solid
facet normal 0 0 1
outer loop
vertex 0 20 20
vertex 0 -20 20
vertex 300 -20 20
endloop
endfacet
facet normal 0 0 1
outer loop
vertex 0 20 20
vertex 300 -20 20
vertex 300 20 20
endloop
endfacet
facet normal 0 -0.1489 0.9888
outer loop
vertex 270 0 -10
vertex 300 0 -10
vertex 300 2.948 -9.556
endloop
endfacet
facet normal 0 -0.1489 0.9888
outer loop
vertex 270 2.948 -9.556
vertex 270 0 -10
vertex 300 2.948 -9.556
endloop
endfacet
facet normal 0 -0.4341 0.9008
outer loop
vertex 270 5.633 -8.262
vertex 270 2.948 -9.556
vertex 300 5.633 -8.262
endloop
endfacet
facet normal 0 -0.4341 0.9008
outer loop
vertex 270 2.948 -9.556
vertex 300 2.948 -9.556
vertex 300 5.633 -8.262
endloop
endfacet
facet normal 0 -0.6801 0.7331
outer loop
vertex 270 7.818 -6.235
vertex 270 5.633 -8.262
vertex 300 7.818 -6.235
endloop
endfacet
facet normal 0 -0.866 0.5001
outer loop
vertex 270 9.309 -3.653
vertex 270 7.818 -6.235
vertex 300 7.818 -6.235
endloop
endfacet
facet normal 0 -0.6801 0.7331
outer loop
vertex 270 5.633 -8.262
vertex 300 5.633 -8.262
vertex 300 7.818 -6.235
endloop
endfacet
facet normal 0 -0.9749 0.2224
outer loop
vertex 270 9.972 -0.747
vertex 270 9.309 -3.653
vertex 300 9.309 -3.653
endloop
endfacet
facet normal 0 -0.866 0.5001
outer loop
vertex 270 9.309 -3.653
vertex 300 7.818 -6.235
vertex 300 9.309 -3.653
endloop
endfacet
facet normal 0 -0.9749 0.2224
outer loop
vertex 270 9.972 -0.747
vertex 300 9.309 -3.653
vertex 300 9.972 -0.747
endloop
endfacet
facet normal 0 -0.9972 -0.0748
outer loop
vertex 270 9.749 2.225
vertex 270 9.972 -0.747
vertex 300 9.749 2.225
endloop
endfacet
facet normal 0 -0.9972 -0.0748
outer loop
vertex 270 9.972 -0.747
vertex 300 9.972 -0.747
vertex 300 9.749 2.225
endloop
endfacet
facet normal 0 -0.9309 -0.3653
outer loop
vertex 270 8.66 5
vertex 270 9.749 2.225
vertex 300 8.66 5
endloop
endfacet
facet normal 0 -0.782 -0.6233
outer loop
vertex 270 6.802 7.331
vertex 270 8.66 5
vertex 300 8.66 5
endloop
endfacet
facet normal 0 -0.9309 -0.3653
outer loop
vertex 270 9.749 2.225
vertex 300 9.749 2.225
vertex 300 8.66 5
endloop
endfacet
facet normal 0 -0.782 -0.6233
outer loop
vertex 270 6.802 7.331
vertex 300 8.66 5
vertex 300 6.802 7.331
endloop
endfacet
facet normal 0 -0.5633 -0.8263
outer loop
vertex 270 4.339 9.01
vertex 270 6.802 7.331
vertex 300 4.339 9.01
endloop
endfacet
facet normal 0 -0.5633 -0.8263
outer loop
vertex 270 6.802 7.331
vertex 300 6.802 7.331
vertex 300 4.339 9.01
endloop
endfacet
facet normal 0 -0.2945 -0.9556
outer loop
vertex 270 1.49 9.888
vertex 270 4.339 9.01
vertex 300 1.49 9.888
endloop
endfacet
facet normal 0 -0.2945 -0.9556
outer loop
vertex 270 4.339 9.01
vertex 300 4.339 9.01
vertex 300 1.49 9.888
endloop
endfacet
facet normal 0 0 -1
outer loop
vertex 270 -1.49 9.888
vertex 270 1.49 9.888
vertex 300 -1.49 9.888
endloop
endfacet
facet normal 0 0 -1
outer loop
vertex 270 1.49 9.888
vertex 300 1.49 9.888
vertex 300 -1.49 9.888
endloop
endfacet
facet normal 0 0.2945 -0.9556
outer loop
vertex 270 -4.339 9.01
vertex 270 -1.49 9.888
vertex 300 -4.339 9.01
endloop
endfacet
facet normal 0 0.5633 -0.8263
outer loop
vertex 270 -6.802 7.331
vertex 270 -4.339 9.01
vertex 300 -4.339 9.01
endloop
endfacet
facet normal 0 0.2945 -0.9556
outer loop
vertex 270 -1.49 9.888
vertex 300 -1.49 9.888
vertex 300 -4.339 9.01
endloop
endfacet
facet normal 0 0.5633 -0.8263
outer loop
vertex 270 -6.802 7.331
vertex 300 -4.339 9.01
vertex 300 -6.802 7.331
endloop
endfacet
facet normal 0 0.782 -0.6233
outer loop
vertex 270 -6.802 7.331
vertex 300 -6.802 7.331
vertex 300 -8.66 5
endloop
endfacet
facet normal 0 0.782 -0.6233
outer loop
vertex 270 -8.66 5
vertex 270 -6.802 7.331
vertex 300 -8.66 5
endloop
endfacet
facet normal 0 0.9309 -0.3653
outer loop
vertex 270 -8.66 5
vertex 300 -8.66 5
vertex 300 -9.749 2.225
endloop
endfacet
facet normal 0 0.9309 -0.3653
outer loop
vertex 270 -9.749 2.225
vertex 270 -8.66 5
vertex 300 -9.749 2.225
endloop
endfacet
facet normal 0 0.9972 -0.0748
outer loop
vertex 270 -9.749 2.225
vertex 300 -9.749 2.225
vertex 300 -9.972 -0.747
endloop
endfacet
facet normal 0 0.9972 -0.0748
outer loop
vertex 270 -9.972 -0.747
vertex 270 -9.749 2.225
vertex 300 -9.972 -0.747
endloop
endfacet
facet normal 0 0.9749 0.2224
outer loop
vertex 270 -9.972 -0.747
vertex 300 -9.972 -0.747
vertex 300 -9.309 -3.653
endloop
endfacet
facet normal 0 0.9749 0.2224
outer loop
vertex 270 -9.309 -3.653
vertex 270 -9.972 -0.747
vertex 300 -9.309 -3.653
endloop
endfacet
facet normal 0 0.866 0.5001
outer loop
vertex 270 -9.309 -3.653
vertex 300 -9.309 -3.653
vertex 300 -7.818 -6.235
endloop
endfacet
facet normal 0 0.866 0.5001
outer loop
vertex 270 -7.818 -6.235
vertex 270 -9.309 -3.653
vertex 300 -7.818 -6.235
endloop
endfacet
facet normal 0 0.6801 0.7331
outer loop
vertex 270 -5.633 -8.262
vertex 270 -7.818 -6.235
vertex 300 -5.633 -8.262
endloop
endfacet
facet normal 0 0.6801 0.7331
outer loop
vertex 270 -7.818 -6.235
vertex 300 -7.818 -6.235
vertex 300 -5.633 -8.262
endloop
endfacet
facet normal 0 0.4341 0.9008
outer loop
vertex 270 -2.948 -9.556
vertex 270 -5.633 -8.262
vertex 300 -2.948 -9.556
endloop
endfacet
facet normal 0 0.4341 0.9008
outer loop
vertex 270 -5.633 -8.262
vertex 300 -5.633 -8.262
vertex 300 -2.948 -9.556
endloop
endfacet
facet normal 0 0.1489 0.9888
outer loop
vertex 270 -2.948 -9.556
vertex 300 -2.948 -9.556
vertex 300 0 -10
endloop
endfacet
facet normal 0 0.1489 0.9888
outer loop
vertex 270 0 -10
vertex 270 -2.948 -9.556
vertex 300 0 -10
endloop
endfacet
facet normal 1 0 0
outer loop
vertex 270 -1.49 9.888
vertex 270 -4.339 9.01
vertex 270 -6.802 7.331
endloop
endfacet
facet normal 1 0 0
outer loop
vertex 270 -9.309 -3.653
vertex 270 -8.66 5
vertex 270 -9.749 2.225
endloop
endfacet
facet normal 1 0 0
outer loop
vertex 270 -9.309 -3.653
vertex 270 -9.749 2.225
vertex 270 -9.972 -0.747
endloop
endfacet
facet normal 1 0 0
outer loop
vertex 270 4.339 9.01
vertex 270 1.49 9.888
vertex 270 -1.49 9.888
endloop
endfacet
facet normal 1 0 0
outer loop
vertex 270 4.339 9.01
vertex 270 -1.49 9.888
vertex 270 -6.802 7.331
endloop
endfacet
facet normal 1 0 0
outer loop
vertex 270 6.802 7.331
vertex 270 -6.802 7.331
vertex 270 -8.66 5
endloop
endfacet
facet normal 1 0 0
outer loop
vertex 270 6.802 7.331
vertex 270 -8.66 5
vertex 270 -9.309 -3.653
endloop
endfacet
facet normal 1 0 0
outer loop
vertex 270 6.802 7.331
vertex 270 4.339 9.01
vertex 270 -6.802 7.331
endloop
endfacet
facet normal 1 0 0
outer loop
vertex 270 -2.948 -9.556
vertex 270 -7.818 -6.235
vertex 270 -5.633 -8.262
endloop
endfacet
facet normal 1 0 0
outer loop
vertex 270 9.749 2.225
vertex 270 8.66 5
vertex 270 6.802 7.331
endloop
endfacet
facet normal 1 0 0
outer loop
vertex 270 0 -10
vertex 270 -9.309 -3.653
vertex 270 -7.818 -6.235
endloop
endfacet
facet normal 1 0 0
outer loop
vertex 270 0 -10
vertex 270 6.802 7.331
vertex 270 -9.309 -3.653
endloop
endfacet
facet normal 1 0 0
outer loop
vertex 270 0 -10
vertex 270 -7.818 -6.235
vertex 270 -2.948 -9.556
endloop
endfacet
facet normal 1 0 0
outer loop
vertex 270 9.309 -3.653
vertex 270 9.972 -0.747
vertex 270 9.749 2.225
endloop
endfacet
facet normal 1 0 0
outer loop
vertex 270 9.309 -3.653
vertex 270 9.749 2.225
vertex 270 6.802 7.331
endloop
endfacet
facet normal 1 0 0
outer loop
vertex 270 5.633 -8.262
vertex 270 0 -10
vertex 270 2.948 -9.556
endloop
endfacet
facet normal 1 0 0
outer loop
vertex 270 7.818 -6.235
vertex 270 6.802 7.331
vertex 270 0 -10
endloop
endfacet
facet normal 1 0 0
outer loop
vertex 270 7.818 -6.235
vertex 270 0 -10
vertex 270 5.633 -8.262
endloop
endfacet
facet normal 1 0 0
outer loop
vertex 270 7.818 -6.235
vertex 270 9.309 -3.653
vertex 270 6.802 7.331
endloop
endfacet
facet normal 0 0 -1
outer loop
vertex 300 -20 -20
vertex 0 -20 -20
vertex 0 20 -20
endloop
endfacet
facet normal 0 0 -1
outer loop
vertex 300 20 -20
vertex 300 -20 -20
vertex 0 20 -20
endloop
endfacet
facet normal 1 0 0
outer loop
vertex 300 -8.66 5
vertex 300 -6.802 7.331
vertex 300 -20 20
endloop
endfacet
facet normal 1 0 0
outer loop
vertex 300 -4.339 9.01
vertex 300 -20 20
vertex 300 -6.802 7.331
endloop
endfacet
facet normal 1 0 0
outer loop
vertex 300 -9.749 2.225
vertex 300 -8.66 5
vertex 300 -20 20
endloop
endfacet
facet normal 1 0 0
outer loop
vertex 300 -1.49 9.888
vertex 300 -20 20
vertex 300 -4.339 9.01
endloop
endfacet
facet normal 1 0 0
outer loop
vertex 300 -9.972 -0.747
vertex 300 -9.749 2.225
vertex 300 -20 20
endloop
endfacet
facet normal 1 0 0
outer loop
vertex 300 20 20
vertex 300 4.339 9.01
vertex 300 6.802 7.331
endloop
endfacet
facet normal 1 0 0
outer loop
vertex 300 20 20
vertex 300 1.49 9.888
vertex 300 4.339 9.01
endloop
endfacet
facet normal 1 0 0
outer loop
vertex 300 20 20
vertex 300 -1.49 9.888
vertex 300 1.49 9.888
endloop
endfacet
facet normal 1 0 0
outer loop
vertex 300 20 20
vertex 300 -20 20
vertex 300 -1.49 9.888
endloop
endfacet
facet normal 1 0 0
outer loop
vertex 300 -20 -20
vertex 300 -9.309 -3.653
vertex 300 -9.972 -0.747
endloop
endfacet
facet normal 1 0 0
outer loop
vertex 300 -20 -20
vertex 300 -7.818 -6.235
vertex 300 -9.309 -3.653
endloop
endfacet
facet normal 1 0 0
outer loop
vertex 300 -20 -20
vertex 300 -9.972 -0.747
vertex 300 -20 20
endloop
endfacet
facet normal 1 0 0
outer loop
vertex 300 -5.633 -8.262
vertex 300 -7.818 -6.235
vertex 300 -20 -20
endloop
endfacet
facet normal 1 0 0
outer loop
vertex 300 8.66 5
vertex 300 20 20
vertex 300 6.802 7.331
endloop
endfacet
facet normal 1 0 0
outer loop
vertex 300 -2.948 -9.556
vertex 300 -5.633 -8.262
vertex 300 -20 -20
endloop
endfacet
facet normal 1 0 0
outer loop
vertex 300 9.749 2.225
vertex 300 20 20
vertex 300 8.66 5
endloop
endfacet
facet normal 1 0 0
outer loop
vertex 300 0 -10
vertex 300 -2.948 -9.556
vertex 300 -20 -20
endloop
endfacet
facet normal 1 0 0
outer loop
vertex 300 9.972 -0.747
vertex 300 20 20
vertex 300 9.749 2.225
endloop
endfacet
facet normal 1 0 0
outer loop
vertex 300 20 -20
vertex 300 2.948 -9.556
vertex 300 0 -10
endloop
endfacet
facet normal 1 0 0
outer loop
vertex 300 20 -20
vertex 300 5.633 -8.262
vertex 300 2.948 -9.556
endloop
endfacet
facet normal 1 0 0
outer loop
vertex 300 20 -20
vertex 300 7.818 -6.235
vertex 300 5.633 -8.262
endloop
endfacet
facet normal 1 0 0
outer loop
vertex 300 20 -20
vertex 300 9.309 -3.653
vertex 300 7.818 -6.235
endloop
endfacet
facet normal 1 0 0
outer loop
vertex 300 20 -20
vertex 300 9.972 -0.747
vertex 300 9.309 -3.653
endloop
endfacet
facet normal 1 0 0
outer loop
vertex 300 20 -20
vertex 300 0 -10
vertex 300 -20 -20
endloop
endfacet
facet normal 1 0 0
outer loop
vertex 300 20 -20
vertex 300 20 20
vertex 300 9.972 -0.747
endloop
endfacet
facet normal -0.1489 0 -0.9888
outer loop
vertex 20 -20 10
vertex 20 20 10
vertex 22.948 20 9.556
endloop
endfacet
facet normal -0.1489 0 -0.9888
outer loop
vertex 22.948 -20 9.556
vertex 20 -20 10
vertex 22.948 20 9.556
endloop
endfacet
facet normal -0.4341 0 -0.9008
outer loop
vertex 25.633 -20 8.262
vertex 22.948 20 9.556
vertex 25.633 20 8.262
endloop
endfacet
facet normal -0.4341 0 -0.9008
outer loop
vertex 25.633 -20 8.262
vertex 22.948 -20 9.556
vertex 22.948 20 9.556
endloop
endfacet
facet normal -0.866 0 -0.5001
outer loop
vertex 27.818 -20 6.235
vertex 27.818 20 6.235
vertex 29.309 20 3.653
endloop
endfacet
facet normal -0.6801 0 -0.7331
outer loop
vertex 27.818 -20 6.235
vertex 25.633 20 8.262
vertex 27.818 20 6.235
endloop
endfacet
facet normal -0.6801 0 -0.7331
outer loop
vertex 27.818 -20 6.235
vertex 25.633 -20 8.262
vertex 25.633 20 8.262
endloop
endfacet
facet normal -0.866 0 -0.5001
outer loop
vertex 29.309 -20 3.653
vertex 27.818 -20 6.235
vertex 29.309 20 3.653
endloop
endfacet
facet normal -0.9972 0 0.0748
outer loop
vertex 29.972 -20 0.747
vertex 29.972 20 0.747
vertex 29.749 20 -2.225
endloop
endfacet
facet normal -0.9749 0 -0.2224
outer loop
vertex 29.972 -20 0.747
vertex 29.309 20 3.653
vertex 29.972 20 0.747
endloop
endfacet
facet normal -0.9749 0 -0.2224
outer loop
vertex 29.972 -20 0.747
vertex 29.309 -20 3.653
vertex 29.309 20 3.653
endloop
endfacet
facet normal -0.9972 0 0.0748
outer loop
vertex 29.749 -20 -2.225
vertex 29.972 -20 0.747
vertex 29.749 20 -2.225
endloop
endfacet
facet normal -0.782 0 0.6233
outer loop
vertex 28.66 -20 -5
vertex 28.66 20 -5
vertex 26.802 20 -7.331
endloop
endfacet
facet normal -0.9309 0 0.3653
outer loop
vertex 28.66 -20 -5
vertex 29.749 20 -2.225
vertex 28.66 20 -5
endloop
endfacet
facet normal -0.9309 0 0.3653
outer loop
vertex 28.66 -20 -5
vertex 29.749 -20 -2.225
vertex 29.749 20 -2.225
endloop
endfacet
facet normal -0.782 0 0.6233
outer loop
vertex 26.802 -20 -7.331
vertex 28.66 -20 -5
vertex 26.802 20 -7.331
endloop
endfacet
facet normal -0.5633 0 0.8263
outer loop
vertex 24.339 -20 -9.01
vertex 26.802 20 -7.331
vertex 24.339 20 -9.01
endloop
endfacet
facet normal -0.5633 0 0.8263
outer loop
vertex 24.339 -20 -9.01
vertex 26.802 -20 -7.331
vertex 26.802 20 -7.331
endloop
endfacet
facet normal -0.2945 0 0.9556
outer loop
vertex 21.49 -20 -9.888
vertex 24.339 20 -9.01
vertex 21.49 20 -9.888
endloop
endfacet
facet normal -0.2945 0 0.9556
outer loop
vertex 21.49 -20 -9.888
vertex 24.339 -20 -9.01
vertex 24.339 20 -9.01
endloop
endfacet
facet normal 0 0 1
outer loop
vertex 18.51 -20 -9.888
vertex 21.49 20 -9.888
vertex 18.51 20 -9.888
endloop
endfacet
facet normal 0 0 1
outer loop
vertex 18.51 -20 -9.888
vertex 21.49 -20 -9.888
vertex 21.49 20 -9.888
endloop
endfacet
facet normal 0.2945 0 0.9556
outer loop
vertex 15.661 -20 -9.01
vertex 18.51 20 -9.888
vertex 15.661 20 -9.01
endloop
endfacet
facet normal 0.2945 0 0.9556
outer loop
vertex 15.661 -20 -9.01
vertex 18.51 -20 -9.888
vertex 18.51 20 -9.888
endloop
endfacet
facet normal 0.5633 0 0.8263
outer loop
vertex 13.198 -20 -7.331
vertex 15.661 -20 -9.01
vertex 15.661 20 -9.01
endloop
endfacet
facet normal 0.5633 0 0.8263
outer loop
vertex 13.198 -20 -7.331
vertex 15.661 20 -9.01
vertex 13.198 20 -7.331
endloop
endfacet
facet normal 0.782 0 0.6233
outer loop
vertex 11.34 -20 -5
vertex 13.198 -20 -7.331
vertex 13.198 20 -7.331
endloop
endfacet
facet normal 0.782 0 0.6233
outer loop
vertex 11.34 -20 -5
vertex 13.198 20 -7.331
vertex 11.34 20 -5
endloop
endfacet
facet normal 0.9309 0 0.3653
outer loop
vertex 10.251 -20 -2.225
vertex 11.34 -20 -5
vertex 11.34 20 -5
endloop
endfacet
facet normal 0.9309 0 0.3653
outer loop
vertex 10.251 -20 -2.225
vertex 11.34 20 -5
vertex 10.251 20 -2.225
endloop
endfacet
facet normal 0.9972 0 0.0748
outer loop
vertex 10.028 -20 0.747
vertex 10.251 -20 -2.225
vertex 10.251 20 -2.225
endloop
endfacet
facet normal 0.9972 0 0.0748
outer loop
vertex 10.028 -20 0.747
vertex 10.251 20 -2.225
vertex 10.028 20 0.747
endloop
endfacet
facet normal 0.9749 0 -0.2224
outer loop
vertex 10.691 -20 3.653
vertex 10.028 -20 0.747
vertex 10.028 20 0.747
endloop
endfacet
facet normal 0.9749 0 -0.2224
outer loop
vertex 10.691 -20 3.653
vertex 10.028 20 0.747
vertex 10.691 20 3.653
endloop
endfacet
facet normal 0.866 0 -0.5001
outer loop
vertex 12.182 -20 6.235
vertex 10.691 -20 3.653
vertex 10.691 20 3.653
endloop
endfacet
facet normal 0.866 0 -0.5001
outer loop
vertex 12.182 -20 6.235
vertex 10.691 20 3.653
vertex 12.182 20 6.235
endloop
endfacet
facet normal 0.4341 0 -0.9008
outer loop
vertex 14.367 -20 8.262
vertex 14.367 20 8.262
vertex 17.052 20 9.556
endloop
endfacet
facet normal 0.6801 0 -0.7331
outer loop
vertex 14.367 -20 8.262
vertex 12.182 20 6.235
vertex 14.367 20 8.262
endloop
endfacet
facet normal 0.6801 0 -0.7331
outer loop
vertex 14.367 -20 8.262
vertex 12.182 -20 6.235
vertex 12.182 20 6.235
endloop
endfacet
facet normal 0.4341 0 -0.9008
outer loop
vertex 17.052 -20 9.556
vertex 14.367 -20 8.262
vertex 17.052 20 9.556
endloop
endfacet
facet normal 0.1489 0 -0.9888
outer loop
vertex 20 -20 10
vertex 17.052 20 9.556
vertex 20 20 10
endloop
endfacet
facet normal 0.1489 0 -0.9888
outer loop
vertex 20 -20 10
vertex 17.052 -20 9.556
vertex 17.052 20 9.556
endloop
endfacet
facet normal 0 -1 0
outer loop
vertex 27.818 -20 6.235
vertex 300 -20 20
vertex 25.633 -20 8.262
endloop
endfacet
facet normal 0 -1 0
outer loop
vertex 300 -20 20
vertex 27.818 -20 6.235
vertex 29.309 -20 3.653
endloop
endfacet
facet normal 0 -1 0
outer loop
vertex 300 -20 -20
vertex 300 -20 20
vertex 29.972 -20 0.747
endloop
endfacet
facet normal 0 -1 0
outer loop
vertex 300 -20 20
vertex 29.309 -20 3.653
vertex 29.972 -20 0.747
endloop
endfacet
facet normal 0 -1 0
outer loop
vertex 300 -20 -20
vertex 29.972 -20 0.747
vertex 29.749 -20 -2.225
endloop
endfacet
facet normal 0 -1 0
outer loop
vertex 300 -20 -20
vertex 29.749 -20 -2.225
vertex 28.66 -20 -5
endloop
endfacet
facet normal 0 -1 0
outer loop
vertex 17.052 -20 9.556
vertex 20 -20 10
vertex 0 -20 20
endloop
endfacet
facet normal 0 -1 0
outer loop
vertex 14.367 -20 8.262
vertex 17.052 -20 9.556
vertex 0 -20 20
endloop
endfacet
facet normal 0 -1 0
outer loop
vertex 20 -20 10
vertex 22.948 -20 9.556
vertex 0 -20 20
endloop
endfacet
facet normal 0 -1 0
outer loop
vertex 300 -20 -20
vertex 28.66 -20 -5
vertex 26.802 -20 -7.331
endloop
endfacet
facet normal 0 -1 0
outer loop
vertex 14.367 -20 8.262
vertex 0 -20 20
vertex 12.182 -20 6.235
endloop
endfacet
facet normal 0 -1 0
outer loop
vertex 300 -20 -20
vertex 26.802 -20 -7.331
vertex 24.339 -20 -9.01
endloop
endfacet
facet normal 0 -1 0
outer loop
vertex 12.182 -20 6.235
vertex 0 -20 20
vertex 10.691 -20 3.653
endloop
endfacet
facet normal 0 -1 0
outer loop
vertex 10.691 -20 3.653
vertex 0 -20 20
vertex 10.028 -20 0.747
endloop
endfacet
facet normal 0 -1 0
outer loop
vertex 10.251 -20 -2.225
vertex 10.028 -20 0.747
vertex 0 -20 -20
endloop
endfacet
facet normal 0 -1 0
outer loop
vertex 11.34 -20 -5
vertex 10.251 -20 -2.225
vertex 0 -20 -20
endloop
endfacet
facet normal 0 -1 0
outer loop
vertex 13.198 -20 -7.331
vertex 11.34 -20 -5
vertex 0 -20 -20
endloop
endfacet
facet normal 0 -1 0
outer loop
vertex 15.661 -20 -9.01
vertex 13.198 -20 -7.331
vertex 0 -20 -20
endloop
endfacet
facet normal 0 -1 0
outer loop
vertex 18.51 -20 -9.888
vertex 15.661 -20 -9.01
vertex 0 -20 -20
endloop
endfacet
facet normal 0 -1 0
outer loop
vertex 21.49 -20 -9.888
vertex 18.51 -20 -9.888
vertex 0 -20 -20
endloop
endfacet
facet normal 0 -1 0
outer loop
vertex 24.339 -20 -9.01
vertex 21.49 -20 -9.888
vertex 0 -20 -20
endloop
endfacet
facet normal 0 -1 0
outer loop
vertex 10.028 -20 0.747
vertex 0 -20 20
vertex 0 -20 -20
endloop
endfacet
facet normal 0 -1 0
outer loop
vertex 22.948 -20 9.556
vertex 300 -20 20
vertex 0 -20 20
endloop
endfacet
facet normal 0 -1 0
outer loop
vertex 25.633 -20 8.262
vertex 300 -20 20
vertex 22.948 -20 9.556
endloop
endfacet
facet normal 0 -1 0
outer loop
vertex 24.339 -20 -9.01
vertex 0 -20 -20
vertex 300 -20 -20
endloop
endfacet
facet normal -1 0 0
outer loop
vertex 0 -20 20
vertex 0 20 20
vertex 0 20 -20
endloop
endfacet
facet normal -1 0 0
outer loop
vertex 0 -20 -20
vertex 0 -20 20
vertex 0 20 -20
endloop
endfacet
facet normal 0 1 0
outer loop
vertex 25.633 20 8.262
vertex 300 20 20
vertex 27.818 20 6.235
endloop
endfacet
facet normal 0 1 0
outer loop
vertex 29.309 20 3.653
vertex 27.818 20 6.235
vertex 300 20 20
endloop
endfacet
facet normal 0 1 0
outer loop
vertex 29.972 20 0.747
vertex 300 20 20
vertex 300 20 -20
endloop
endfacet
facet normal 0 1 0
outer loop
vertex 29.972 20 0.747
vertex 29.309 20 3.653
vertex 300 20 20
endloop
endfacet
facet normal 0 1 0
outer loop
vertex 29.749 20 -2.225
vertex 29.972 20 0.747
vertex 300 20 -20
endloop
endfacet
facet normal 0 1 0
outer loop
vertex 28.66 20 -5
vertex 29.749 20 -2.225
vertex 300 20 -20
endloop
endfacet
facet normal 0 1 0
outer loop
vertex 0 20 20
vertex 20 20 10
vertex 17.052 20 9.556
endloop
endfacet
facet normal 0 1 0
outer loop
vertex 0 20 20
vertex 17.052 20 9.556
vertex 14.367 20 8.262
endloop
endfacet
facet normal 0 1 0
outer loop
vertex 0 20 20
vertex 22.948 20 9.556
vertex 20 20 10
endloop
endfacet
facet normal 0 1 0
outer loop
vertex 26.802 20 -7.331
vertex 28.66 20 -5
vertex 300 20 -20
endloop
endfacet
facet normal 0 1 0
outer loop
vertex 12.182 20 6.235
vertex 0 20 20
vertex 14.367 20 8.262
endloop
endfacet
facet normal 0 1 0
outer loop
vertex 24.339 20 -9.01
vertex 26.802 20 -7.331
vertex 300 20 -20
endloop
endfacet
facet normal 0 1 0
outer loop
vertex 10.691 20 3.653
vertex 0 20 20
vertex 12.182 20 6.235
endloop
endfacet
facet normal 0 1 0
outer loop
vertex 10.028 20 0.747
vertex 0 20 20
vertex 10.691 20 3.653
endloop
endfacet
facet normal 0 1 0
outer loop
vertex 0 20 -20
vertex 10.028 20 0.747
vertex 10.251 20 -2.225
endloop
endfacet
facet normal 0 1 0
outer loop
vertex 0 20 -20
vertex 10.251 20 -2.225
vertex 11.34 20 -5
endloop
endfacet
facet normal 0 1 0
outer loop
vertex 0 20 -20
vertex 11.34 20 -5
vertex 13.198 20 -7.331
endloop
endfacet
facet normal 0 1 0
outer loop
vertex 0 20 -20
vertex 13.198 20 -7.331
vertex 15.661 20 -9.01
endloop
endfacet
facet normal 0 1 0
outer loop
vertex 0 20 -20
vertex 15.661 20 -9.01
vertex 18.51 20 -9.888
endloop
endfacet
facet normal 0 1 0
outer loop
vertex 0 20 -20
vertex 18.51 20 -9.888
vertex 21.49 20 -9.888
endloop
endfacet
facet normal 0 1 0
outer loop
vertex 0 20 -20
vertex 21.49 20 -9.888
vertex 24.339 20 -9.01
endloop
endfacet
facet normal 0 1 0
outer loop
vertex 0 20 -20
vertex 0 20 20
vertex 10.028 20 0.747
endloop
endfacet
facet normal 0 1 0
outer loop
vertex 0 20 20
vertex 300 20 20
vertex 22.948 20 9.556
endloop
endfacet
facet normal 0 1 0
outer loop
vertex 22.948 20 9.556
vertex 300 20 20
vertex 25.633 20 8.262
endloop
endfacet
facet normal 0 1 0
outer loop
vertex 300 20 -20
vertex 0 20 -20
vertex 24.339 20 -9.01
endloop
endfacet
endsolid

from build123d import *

# Parameters (mm, degrees)
SKETCH1_W               = 40
SKETCH1_H               = 40
BOSS_EXTRUDE1_DEPTH     = 300
CUT_EXTRUDE1_DEPTH      = 100
CUT_EXTRUDE1_DEPTH_BACK = 100
SKETCH2_R               = 10
CUT_EXTRUDE2_DEPTH      = 50
CUT_EXTRUDE2_DEPTH_BACK = 50
SKETCH3_R               = 10
SKETCH4_W               = 40
SKETCH4_H               = 40
BOSS_EXTRUDE2_DEPTH     = 300
CUT_EXTRUDE3_DEPTH      = 80
CUT_EXTRUDE3_DEPTH_BACK = 80
SKETCH5_R               = 10
SKETCH6_R               = 10
CUT_EXTRUDE4_DEPTH      = 30


with BuildPart() as part:
    # Sketch1 → Boss-Extrude1 (new body)
    with BuildSketch(Plane(origin=(0, 0, 0), x_dir=(0, 0, -1), z_dir=(1, 0, 0))):
        Rectangle(SKETCH1_W, SKETCH1_H)
    extrude(amount=BOSS_EXTRUDE1_DEPTH)

    # Sketch2 → Cut-Extrude1 (cut, two sides: drawn at the far end of the back side and taken through both)
    with BuildSketch(Plane(origin=(0, 0, 0), x_dir=(1, 0, 0), z_dir=(0, 1, 0)).offset(-CUT_EXTRUDE1_DEPTH_BACK)):
        with Locations((20, 0)):
            Circle(SKETCH2_R)
    extrude(amount=CUT_EXTRUDE1_DEPTH + CUT_EXTRUDE1_DEPTH_BACK, mode=Mode.SUBTRACT)

    # Sketch3 → Cut-Extrude2 (cut, two sides: drawn at the far end of the back side and taken through both)
    with BuildSketch(Plane(origin=(300, 0, 0), x_dir=(0, 0, -1), z_dir=(1, 0, 0)).offset(-CUT_EXTRUDE2_DEPTH_BACK)):
        Circle(SKETCH3_R)
    extrude(amount=CUT_EXTRUDE2_DEPTH + CUT_EXTRUDE2_DEPTH_BACK, mode=Mode.SUBTRACT)

    # Sketch4 → Boss-Extrude2 (add)
    with BuildSketch(Plane(origin=(0, 0, 0), x_dir=(0, 0, -1), z_dir=(1, 0, 0))):
        Rectangle(SKETCH4_W, SKETCH4_H)
    extrude(amount=BOSS_EXTRUDE2_DEPTH)

    # Sketch5 → Cut-Extrude3 (cut, two sides: drawn at the far end of the back side and taken through both)
    with BuildSketch(Plane(origin=(0, 0, 0), x_dir=(1, 0, 0), z_dir=(0, 1, 0)).offset(-CUT_EXTRUDE3_DEPTH_BACK)):
        with Locations((20, 0)):
            Circle(SKETCH5_R)
    extrude(amount=CUT_EXTRUDE3_DEPTH + CUT_EXTRUDE3_DEPTH_BACK, mode=Mode.SUBTRACT)

    # Sketch6 → Cut-Extrude4 (cut)
    with BuildSketch(Plane(origin=(300, 0, 0), x_dir=(0, 0, -1), z_dir=(1, 0, 0))):
        Circle(SKETCH6_R)
    extrude(amount=-CUT_EXTRUDE4_DEPTH, mode=Mode.SUBTRACT)


solid = part.part
